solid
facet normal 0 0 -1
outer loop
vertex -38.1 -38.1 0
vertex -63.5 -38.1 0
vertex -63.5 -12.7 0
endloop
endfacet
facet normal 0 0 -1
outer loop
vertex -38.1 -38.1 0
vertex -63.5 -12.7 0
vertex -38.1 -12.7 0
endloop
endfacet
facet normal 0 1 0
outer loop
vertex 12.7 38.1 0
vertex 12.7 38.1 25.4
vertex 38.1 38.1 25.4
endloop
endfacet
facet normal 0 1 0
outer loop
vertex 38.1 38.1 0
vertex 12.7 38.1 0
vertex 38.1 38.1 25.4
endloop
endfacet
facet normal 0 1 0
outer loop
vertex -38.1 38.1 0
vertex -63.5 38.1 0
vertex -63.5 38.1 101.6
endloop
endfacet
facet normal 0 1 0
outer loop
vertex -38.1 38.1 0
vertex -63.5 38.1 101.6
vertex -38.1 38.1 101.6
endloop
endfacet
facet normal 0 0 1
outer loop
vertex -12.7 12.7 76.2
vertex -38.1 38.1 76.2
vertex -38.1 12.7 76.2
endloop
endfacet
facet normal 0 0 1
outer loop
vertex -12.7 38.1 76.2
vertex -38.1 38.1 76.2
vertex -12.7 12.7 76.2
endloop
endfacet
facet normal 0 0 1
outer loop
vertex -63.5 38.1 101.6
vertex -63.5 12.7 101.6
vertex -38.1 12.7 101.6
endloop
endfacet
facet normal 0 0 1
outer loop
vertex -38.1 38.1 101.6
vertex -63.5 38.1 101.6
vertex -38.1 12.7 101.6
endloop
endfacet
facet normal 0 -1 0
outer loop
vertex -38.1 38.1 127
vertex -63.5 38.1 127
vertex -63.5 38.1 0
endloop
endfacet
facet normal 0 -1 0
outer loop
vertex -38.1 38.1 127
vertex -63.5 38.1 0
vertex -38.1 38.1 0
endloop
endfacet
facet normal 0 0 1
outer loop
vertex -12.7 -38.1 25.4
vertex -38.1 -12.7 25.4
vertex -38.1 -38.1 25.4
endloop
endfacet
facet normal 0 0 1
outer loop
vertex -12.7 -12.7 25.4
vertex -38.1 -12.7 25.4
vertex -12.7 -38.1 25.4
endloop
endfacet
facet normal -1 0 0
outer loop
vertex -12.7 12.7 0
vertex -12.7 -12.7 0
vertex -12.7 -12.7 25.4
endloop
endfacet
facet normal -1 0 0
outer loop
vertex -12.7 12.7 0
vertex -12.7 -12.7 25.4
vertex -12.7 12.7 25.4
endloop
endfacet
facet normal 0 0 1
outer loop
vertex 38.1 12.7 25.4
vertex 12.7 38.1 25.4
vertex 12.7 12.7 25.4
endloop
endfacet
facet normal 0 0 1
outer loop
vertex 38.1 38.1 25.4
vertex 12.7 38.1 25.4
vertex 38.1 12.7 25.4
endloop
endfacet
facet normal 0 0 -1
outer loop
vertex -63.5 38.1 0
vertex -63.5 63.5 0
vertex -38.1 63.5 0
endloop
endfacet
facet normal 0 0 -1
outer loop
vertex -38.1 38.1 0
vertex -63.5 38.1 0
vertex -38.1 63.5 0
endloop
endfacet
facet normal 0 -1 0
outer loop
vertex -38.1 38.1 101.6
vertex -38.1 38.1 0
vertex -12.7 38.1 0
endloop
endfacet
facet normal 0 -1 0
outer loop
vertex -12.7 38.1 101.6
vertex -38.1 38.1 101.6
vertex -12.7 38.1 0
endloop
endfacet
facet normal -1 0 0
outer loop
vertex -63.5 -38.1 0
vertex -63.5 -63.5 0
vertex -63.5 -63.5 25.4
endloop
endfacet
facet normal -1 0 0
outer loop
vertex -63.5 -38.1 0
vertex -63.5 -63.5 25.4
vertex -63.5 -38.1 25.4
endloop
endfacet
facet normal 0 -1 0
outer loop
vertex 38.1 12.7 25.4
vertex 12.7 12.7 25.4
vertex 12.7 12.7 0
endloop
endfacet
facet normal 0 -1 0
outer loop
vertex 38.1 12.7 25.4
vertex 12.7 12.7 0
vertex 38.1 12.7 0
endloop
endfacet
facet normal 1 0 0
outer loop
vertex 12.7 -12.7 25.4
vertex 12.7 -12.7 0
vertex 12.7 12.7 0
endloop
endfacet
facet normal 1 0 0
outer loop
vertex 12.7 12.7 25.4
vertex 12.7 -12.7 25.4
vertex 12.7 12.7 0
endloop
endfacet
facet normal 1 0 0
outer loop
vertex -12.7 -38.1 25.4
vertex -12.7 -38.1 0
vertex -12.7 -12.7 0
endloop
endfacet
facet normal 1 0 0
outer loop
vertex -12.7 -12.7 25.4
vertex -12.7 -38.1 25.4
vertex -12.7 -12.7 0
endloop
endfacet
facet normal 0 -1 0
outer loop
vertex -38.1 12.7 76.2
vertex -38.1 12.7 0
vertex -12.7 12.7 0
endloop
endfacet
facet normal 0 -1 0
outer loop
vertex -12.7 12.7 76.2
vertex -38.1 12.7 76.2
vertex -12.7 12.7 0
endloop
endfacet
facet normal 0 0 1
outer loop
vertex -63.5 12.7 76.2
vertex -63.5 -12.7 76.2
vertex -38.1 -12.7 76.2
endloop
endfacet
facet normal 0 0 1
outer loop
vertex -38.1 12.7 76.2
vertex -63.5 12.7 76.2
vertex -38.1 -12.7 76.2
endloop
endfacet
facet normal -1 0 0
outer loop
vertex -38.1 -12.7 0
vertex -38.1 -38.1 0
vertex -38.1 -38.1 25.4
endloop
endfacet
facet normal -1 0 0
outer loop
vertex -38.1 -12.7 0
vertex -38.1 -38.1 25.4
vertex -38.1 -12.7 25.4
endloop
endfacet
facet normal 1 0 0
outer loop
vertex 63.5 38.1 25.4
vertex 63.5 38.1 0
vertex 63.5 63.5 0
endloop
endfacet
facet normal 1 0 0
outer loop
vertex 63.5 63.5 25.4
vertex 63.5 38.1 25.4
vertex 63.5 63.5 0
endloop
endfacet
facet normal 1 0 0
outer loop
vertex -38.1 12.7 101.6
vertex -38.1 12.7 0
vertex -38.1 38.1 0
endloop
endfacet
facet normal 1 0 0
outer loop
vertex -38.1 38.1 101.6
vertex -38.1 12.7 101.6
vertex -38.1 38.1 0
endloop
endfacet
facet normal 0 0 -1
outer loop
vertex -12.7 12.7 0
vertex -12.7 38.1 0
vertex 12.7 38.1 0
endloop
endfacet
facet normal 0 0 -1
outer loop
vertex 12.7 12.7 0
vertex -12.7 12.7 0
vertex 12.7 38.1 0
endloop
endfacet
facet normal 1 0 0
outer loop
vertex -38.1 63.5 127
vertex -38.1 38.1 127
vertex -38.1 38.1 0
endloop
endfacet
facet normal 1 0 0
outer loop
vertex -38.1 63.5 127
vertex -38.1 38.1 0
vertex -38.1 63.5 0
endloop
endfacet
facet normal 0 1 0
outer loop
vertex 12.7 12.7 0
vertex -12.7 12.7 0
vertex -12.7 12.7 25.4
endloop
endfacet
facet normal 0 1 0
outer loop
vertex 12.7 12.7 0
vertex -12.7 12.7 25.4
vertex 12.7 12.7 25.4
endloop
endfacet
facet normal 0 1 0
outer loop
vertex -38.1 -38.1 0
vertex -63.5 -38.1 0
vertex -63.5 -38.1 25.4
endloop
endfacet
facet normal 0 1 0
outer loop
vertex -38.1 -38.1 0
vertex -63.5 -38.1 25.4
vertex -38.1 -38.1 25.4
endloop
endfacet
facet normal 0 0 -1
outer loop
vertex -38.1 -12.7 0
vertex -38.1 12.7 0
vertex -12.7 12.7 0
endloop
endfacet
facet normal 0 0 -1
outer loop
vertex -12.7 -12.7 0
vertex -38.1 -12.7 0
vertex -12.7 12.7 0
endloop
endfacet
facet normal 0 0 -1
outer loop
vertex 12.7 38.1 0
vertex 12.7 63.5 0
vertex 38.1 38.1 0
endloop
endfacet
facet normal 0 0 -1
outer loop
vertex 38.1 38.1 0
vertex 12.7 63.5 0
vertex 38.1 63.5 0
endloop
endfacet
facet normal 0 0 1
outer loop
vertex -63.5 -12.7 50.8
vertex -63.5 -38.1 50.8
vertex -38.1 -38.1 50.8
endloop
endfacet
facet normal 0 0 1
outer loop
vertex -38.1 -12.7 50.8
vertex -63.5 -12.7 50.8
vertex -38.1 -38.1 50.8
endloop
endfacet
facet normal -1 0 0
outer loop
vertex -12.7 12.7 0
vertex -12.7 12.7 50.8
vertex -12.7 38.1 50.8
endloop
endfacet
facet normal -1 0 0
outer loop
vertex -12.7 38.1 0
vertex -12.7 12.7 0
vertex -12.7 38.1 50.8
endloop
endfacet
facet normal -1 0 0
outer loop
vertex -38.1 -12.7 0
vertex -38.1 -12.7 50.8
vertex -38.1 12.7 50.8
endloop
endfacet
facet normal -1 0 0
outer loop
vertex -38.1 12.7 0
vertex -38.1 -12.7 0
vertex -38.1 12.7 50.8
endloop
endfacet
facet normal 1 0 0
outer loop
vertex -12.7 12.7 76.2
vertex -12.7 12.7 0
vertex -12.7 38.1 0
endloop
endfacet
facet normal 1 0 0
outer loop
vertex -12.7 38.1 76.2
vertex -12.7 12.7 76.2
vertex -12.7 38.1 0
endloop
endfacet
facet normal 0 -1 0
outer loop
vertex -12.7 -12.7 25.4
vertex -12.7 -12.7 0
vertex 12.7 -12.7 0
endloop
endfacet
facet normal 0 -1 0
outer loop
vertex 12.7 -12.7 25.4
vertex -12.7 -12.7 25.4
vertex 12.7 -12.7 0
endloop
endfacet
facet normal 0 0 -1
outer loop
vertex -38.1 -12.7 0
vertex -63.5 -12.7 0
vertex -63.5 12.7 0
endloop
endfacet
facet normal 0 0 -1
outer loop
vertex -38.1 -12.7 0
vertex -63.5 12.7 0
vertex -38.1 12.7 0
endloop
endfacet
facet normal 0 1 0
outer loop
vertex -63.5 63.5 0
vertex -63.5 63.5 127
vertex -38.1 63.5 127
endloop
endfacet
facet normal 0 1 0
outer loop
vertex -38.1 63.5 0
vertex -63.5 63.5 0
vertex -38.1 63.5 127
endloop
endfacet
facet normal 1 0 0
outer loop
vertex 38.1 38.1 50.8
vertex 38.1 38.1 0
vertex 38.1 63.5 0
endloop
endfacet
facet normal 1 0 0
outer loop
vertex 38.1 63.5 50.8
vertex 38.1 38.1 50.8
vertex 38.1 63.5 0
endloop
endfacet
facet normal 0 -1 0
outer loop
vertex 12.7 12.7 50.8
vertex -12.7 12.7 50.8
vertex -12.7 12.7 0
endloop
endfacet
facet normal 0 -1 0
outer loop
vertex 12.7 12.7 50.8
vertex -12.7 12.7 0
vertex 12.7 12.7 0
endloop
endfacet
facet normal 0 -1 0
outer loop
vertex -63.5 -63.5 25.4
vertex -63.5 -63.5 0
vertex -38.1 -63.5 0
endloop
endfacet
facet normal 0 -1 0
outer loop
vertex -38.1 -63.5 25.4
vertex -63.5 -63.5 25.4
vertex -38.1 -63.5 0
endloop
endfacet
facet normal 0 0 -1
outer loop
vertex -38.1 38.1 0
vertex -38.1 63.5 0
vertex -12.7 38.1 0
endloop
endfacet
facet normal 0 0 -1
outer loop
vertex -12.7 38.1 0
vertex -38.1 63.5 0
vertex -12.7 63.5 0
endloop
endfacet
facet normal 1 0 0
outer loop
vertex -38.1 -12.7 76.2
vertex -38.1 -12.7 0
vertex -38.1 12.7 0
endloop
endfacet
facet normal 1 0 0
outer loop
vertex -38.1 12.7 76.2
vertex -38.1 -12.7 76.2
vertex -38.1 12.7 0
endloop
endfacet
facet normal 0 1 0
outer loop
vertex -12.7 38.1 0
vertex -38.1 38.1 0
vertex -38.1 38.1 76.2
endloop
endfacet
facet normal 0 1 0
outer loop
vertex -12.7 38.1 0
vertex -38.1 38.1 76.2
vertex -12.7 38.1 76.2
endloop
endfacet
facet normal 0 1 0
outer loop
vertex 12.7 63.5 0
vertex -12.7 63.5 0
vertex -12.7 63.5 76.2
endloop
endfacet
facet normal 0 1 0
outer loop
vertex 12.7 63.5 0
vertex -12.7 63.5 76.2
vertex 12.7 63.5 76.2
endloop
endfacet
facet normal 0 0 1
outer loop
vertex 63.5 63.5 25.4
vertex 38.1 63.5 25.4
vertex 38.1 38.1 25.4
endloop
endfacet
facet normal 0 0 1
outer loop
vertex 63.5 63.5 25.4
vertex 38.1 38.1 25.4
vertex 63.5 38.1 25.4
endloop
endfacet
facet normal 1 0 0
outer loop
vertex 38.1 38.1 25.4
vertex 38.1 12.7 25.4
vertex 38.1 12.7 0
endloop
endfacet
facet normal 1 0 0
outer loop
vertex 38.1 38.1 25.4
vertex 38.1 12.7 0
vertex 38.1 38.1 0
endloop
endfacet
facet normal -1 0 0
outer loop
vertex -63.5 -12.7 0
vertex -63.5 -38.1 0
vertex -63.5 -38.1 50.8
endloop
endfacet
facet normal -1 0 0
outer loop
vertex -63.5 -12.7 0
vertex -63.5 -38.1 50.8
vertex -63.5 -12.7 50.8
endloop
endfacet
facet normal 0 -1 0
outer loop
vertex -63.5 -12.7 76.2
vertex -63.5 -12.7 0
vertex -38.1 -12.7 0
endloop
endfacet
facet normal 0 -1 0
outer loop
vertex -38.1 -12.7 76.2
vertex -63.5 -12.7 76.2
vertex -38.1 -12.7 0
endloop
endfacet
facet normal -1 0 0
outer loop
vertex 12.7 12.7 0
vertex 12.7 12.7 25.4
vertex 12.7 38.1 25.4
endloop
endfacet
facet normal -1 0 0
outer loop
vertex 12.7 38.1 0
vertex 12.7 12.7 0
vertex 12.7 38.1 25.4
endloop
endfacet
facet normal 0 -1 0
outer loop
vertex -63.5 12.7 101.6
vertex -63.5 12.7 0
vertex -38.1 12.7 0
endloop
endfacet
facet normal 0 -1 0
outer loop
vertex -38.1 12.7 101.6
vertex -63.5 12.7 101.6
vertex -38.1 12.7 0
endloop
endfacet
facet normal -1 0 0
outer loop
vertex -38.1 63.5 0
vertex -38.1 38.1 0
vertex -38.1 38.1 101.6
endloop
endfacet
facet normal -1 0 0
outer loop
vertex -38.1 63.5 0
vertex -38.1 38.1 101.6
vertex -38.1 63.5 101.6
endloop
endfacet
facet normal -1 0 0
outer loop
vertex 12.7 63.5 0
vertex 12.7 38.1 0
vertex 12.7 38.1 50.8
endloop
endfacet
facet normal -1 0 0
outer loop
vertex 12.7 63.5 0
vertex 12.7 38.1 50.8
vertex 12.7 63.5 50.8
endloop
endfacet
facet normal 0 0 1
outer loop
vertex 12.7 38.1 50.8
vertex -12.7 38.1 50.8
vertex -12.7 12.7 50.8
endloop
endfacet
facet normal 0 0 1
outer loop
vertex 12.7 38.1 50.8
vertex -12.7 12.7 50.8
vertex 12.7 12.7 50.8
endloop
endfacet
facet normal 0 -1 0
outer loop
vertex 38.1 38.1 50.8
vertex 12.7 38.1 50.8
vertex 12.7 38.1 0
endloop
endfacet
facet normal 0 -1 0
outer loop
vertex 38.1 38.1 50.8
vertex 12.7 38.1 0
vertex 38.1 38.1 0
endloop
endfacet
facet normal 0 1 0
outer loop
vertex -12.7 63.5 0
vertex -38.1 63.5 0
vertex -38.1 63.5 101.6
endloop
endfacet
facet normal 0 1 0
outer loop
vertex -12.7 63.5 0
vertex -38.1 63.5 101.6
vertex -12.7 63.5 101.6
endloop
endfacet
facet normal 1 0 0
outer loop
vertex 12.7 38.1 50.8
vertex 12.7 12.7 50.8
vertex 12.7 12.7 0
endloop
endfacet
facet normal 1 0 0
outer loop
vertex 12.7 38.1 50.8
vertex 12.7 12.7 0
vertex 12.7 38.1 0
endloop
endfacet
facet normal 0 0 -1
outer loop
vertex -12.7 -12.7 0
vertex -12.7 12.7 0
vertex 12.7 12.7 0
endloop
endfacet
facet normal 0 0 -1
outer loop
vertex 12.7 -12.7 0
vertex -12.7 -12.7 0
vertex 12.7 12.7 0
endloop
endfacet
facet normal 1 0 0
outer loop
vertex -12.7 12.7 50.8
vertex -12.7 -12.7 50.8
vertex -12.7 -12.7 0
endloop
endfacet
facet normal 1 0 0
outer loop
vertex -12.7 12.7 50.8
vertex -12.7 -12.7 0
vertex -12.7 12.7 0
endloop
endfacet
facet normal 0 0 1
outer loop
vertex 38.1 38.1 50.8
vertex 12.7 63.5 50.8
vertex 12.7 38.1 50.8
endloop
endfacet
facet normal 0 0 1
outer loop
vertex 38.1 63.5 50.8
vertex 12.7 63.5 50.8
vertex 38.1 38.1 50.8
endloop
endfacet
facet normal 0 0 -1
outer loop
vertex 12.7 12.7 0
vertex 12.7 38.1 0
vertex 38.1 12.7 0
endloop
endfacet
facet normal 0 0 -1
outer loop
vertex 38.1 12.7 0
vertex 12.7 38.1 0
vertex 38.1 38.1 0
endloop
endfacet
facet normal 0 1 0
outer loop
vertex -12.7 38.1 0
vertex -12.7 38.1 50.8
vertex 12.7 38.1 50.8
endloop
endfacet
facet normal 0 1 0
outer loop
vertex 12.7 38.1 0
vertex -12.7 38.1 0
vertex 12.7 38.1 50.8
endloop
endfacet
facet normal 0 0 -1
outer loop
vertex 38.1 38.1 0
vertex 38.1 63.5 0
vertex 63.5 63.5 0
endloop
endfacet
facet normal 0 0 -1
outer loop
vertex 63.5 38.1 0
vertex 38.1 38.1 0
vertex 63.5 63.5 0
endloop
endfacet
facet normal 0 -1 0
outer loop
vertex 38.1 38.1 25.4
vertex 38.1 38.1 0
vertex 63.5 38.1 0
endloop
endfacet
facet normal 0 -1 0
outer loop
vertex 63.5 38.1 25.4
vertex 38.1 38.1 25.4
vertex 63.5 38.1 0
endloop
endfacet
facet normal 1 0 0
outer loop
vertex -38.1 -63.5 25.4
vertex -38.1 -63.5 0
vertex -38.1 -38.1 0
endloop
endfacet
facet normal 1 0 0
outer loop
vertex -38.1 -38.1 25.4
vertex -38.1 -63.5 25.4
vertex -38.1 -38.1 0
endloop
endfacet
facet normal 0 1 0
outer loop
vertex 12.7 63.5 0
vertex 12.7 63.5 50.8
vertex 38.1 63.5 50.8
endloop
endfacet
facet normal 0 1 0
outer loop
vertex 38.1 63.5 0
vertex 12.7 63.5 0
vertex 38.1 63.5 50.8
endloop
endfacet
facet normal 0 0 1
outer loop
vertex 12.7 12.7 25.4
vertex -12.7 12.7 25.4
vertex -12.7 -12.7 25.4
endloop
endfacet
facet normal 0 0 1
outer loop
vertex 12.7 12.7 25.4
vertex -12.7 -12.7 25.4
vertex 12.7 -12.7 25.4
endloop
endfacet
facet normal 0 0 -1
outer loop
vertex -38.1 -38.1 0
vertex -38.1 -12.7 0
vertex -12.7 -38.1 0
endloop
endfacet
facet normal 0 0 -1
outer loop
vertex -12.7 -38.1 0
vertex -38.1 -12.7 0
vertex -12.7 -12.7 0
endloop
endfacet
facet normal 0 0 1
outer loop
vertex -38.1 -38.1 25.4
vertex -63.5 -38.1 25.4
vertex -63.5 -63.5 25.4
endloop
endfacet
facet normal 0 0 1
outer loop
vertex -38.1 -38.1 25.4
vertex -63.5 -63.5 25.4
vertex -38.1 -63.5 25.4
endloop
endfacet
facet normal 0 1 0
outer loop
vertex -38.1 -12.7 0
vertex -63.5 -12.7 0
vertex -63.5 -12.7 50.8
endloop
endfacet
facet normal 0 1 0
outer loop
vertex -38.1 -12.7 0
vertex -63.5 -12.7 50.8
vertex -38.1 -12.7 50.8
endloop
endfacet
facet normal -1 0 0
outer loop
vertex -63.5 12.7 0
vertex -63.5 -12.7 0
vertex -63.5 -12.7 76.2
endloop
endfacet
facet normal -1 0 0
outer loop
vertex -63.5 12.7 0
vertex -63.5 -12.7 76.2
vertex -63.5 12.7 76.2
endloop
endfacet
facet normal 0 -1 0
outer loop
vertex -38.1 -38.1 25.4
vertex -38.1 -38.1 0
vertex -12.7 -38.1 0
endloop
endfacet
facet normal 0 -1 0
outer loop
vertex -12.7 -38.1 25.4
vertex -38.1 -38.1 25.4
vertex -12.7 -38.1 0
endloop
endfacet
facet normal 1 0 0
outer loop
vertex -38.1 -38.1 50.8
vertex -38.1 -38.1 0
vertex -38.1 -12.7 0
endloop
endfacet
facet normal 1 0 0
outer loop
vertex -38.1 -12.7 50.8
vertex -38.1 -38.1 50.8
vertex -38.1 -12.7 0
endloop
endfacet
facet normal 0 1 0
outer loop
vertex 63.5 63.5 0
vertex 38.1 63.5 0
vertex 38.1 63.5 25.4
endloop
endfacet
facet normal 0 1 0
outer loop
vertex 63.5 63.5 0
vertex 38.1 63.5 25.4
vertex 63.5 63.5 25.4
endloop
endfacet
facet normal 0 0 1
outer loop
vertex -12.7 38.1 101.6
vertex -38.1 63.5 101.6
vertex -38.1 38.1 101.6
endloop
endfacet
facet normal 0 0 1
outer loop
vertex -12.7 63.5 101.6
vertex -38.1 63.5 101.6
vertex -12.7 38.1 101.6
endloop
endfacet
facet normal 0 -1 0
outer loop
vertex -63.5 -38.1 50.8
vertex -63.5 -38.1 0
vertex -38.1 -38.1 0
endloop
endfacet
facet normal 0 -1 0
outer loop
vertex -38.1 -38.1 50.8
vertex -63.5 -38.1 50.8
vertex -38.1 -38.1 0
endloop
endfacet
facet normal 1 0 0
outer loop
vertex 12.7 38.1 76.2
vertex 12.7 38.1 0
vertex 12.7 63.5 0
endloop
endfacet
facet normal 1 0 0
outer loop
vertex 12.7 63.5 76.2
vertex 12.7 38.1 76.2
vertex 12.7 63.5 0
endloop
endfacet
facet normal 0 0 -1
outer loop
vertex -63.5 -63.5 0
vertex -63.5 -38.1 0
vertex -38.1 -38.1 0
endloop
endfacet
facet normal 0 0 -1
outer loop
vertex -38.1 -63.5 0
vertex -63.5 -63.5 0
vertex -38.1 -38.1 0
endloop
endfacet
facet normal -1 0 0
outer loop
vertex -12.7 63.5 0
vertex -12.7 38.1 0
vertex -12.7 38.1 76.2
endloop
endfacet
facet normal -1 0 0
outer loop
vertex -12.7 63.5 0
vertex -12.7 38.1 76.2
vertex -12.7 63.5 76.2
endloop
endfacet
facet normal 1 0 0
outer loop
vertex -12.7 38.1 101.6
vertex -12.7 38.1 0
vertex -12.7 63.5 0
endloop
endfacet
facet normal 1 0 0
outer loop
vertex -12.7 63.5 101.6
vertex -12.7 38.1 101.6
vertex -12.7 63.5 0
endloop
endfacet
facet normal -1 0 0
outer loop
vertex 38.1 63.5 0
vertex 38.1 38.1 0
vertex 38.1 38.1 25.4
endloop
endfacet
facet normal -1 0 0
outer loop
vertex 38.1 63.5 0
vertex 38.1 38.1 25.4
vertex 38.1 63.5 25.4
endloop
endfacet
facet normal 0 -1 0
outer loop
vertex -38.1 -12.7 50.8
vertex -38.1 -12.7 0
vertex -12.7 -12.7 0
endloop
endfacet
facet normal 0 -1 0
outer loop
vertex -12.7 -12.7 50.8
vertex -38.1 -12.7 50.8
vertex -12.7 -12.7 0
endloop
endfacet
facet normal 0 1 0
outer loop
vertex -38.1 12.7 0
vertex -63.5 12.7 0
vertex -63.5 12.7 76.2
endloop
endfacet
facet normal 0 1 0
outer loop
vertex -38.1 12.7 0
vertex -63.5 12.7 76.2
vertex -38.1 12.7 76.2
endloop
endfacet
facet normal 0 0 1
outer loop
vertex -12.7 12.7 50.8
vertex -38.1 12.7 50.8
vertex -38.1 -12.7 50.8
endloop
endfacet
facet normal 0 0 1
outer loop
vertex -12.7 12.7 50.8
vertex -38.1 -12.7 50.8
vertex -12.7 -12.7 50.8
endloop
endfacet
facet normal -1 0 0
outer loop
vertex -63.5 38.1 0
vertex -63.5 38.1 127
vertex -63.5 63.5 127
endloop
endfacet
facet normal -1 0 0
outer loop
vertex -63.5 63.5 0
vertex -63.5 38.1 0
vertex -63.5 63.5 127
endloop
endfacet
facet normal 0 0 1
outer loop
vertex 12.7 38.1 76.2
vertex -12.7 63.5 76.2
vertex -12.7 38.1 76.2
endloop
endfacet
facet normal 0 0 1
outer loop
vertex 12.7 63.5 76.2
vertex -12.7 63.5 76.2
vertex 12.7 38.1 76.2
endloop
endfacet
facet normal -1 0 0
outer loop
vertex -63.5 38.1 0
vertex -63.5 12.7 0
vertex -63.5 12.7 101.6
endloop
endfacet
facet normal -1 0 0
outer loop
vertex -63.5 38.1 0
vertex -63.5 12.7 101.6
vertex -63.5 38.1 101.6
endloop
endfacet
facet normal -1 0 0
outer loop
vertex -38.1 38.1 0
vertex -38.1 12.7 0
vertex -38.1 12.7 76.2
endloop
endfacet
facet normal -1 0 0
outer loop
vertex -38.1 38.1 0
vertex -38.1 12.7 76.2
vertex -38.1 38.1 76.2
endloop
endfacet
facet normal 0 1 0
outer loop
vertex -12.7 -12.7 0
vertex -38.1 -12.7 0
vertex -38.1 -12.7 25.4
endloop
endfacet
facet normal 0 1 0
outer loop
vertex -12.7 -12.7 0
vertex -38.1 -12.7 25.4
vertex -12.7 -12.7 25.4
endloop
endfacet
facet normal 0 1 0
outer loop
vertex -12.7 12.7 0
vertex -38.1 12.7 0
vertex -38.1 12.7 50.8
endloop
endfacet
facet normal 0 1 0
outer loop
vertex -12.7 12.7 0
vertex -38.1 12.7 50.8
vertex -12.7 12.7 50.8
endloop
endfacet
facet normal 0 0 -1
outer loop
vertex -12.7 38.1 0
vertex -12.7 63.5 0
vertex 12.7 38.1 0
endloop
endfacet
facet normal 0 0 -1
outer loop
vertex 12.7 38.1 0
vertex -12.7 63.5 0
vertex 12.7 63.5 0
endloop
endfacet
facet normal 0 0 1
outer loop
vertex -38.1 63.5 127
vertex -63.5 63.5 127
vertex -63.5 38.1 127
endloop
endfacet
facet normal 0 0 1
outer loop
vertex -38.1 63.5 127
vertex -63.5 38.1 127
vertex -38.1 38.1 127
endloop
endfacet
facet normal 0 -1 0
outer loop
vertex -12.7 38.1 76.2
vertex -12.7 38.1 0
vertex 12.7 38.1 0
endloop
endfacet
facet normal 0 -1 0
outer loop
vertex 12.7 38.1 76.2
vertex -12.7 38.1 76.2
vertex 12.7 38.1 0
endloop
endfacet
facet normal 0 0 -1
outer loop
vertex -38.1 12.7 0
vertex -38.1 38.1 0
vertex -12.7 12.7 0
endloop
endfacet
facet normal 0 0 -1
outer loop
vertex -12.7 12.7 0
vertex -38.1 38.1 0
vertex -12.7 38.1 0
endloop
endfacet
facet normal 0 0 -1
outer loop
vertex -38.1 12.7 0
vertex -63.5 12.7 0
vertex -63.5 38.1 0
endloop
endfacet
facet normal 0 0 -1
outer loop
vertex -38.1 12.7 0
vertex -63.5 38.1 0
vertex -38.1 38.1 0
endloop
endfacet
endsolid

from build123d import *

# Parameters (mm, degrees)
F0_W     = 25.4
F0_H     = 25.4
F1_DEPTH = 25.4
F2_W     = 25.4
F2_H     = 25.4
F3_DEPTH = 50.8
F4_W     = 25.4
F4_H     = 25.4
F5_DEPTH = 76.2
F6_W     = 25.4
F6_H     = 25.4
F7_DEPTH = 101.6
F8_W     = 25.4
F8_H     = 25.4
F9_DEPTH = 127


with BuildPart() as f1:
    # F0 (on Top) → F1 (new body)
    with BuildSketch(Plane.XY):
        with Locations((-25.4, -25.4)):
            Rectangle(F0_W, F0_H)
        with Locations((-50.8, -50.8)):
            Rectangle(F0_W, F0_H)
        Rectangle(F0_W, F0_H)
        with Locations((25.4, 25.4)):
            Rectangle(F0_W, F0_H)
        with Locations((50.8, 50.8)):
            Rectangle(F0_W, F0_H)
    extrude(amount=F1_DEPTH)


with BuildPart() as f3:
    # F2 (on Top) → F3 (new body)
    with BuildSketch(Plane.XY):
        with Locations((-50.8, -25.4)):
            Rectangle(F2_W, F2_H)
        with Locations((25.4, 50.8)):
            Rectangle(F2_W, F2_H)
        with Locations((0, 25.4)):
            Rectangle(F2_W, F2_H)
        with Locations((-25.4, 0)):
            Rectangle(F2_W, F2_H)
    extrude(amount=F3_DEPTH)


with BuildPart() as f5:
    # F4 (on Top) → F5 (new body)
    with BuildSketch(Plane.XY):
        with Locations((-50.8, 0)):
            Rectangle(F4_W, F4_H)
        with Locations((-25.4, 25.4)):
            Rectangle(F4_W, F4_H)
        with Locations((0, 50.8)):
            Rectangle(F4_W, F4_H)
    extrude(amount=F5_DEPTH)


with BuildPart() as f7:
    # F6 (on Top) → F7 (new body)
    with BuildSketch(Plane.XY):
        with Locations((-50.8, 25.4)):
            Rectangle(F6_W, F6_H)
        with Locations((-25.4, 50.8)):
            Rectangle(F6_W, F6_H)
    extrude(amount=F7_DEPTH)


with BuildPart() as f9:
    # F8 (on Top) → F9 (new body)
    with BuildSketch(Plane.XY):
        with Locations((-50.8, 50.8)):
            Rectangle(F8_W, F8_H)
    extrude(amount=F9_DEPTH)


solid = Compound([f1.part, f3.part, f5.part, f7.part, f9.part])
